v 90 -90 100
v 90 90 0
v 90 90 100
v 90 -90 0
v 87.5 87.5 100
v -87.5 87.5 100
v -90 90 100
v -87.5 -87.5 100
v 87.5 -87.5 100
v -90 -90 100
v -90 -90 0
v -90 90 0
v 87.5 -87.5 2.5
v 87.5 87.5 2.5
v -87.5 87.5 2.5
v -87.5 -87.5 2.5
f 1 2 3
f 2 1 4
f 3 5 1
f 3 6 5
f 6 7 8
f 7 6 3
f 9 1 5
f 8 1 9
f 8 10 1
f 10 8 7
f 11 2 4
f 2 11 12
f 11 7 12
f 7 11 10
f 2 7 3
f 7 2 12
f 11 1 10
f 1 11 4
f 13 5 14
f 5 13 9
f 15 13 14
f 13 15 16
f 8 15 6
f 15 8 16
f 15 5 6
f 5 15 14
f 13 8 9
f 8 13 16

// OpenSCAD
$fn = 6;

// garbage: 180x180x

l = 180;
w = 180;
h = 100;

wall = 2.5;
base = 2.5;

l_in = l - wall*2;
w_in = w - wall*2;
h_in = h;

tray_offset = w/4;

//translate([-tray_offset,0,h/2])
//  union(){
//    translate([-l/8,0,0])
//      cube([l/4,wall,h], true);
////    cube([wall,w,h], true);
//  }

difference(){
  translate([0,0,h/2]) cube([l,w,h], true);
  translate([0,0,h/2+base]) cube([l_in, w_in, h_in], true);
}
